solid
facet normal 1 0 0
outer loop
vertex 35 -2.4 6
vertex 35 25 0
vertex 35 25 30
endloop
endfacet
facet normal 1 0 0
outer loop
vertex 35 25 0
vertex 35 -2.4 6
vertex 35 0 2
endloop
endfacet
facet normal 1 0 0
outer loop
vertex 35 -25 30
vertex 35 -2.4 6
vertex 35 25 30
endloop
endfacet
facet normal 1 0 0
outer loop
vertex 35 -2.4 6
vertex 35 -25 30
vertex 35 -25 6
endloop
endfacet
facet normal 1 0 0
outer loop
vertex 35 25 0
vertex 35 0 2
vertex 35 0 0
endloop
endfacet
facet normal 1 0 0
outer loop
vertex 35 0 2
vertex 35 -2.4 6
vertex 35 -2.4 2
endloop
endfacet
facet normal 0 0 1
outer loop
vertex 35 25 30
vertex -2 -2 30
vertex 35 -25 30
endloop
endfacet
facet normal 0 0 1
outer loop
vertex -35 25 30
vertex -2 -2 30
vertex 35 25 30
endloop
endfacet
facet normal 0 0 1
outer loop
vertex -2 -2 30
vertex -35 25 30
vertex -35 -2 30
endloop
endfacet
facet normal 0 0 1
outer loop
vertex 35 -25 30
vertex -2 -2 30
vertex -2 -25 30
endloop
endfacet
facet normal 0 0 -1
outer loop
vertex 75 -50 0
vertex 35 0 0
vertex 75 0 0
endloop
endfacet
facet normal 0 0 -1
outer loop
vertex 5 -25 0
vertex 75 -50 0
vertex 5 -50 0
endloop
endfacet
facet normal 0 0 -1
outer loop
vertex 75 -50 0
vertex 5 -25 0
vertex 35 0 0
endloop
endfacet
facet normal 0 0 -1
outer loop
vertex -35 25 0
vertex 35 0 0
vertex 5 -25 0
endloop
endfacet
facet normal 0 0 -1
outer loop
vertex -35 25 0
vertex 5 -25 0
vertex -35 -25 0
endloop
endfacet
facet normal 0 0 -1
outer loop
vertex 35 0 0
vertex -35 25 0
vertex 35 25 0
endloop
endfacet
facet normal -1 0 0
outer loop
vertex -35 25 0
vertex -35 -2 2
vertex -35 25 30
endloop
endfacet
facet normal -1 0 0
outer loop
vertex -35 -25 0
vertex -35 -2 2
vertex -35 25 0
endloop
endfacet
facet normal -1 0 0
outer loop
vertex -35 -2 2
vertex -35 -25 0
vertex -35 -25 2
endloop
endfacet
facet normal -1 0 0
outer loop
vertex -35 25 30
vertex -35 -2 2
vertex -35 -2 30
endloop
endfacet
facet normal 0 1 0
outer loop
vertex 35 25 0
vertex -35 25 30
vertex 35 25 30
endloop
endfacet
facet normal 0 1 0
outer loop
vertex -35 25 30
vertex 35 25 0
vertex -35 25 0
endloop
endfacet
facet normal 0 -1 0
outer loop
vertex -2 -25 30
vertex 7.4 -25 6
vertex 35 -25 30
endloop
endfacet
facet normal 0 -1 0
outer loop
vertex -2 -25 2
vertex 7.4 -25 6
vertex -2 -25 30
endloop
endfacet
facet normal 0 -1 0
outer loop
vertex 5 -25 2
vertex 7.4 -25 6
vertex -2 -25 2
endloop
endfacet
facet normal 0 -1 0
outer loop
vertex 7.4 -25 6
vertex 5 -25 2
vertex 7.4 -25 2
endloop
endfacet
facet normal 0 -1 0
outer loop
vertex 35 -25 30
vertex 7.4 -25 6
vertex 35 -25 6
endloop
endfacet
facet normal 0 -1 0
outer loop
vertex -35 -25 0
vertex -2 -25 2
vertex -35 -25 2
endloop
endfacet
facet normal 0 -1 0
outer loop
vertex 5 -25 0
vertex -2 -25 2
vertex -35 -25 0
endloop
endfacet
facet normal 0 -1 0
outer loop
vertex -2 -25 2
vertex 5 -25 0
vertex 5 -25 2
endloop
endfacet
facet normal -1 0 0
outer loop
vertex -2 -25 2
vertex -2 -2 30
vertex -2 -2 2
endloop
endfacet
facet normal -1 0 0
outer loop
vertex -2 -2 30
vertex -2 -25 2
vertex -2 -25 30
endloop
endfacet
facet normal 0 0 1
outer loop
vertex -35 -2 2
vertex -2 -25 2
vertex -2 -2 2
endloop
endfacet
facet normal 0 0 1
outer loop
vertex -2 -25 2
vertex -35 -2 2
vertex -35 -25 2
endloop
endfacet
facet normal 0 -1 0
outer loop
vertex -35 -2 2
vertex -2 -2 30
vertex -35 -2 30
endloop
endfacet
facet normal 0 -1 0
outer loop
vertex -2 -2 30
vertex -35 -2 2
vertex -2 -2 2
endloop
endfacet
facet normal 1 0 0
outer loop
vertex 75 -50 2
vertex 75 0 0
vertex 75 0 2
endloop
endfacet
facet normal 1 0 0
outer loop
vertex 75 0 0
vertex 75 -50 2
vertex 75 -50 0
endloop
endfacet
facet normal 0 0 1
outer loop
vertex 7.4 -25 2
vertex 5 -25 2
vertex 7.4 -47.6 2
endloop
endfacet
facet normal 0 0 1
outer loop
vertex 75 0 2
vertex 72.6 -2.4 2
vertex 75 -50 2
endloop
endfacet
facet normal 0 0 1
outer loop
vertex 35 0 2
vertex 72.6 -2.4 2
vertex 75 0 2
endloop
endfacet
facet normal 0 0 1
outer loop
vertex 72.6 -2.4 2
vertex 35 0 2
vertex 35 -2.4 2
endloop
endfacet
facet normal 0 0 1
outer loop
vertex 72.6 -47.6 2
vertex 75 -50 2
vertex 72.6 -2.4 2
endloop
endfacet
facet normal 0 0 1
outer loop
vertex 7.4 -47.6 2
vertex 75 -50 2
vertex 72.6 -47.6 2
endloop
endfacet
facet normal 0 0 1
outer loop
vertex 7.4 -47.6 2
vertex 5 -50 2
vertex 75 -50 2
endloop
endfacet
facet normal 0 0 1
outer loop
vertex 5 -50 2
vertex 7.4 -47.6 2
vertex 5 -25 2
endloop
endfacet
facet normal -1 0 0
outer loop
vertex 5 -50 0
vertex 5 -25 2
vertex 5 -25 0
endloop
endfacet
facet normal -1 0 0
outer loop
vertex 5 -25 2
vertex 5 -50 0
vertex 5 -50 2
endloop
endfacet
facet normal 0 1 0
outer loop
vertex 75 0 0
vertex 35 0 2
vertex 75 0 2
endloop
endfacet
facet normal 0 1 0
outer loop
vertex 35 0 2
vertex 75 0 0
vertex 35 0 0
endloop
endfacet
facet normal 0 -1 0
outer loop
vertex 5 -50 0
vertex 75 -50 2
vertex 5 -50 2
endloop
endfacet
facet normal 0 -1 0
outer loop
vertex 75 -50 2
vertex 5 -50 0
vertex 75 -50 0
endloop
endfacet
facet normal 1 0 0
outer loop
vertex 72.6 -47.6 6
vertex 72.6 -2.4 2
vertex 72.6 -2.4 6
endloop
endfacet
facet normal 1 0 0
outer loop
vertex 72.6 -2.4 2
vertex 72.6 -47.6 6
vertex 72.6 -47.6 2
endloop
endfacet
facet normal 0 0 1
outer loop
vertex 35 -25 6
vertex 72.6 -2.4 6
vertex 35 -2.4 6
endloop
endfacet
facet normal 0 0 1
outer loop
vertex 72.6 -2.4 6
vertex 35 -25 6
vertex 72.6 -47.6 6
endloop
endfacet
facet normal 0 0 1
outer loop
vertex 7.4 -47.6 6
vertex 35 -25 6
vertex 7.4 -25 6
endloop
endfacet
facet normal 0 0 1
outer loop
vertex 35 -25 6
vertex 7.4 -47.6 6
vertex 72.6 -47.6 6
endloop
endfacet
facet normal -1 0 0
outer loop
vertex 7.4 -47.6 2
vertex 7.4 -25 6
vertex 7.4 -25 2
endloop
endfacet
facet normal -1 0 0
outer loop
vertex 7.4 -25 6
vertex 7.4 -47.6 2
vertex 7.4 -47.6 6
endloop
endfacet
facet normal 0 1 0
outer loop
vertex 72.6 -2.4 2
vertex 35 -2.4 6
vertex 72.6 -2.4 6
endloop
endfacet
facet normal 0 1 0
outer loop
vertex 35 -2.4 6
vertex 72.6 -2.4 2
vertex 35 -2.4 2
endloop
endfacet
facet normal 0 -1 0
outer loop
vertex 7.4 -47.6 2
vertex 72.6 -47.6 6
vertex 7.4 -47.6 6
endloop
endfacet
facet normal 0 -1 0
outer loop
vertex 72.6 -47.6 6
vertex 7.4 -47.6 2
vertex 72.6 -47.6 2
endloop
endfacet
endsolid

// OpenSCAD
// Two-part enclosure for a small electronics board (e.g. Arduino-based temperature logger)
// Print orientation: both parts flat on the bed (XY plane), building up in +Z
// Print side by side along X with a 10 mm gap between them

// ---------------- Parameters ----------------
box_x            = 70;    // box outer size in X (mm)
box_y            = 50;    // box outer size in Y (mm)
box_z            = 30;    // box outer size in Z (mm)
box_wall         = 2;     // box wall thickness (mm)
box_floor        = 2;     // box floor thickness (mm)

lid_x            = 70;    // lid plate size in X (mm)
lid_y            = 50;    // lid plate size in Y (mm)
lid_wall         = 1.5;   // lid lip wall thickness (mm)
lid_lip_height   = 4;     // lid lip height above plate (mm)
lip_outer_x      = 65.6;  // outer size of lip in X (mm)
lip_outer_y      = 45.6;  // outer size of lip in Y (mm)
lip_clearance    = 0.2;   // clearance between lip inner/outer edges (mm)

gap              = 10;    // gap between box and lid on the bed (mm)

eps              = 0.5;   // overcut for clean boolean differences (mm)

// Derived values
box_inner_x      = box_x - 2*box_wall;   // 66 mm
box_inner_y      = box_y - 2*box_wall;   // 46 mm
box_open_top_z   = box_z - box_wall;     // top of walls (open)
lip_inner_x      = lip_outer_x - 2*lip_clearance; // 65.2 mm
lip_inner_y      = lip_outer_y - 2*lip_clearance; // 45.2 mm
plate_t          = 2;                    // lid plate thickness (mm)

// ---------------- Model ----------------
union() {
    // Part 1: Box, open top
    translate([-box_x/2, -box_y/2, 0])
        difference() {
            cube([box_x, box_y, box_open_top_z + box_wall]);
            translate([-box_inner_x/2, -box_inner_y/2, box_floor])
                cube([box_inner_x, box_inner_y, box_open_top_z]);
        }

    // Part 2: Lid, printed upside down (lip on top, plate below)
    translate([(box_x + gap)/2, -lid_y/2, 0])
        union() {
            // Base plate
            translate([-lid_x/2, -lid_y/2, 0])
                cube([lid_x, lid_y, plate_t]);

            // Rectangular lip on top of the plate
            translate([-lip_inner_x/2, -lip_inner_y/2, plate_t])
                cube([lip_inner_x, lip_inner_y, lid_lip_height]);
        }
}
